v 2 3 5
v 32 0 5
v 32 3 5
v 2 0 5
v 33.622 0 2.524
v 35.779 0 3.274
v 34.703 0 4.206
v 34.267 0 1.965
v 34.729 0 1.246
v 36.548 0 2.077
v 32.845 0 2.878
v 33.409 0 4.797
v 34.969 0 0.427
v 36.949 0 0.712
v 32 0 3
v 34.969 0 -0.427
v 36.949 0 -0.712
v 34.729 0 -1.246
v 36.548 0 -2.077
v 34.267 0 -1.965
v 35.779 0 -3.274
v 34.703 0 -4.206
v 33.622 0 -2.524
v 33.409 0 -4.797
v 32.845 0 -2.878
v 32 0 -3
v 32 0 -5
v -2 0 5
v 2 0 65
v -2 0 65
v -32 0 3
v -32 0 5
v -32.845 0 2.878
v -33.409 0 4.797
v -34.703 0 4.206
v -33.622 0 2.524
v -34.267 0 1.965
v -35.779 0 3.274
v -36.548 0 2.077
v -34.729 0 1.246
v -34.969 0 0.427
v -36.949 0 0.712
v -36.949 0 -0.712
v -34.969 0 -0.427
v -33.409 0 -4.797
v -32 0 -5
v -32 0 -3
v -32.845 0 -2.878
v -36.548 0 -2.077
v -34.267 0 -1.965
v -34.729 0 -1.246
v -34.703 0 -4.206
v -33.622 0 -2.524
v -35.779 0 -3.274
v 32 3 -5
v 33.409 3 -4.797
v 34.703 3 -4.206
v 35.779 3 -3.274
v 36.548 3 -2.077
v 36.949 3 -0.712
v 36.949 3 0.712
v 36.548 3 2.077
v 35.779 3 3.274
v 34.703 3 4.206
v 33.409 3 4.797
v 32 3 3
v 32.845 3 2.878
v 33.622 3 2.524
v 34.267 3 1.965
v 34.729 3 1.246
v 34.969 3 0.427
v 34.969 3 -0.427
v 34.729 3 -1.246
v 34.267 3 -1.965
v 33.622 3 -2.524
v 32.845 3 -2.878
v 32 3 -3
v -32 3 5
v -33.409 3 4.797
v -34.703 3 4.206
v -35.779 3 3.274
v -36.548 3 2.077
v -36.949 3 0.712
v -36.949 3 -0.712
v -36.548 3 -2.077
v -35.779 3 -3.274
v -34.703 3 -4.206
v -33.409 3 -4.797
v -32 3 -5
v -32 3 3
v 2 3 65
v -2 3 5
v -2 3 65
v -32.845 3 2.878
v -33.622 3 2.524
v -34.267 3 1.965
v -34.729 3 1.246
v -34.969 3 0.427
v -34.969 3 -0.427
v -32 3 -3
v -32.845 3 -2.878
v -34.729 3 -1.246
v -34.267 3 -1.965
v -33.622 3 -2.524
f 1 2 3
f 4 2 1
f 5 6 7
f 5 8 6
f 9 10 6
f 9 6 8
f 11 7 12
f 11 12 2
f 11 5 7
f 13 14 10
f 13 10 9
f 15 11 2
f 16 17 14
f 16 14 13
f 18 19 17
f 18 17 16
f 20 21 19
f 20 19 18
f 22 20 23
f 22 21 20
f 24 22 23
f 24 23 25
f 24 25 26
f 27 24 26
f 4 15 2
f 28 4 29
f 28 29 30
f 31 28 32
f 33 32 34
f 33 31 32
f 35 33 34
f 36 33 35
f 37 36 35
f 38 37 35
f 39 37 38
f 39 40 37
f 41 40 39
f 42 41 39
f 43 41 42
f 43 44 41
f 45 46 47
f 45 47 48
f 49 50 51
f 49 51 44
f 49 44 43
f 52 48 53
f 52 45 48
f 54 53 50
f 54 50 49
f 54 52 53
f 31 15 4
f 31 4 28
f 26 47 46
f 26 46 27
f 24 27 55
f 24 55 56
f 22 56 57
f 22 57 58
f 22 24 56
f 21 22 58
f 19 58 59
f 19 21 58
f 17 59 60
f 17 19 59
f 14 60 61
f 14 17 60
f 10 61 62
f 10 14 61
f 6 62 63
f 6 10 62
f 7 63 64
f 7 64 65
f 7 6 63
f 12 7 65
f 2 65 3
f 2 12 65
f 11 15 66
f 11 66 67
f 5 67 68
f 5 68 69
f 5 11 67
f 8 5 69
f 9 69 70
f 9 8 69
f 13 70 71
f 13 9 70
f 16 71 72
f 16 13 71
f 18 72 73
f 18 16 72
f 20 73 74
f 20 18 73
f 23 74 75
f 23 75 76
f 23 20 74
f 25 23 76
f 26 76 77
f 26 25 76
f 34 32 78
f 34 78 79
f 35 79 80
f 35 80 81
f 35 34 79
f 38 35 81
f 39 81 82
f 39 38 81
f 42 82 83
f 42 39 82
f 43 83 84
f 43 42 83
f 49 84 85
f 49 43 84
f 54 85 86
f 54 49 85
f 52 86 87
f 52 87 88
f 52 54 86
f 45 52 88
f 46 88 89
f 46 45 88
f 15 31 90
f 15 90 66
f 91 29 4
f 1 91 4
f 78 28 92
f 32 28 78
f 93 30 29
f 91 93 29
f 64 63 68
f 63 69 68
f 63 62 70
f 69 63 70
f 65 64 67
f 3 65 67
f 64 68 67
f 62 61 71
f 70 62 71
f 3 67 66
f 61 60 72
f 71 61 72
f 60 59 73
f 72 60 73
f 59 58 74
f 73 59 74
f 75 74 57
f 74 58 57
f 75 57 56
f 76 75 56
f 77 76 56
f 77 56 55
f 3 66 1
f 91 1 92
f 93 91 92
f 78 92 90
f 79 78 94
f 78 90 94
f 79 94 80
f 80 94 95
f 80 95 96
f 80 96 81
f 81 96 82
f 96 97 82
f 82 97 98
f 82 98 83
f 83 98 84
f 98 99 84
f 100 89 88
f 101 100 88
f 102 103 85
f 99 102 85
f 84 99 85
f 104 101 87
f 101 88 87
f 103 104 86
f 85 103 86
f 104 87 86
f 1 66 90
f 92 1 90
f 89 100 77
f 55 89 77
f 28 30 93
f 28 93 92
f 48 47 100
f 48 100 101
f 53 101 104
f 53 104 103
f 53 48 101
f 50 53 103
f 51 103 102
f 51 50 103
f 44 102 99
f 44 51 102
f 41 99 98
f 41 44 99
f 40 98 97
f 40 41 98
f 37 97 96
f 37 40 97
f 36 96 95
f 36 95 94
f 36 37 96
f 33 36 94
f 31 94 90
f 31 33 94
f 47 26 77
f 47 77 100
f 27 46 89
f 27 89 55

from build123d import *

# Parameters (mm, degrees)
SKETCH2_W           = 4
SKETCH2_H           = 60
BOSS_EXTRUDE1_DEPTH = 3


with BuildPart() as part:
    # Sketch2 → Boss-Extrude1 (new body)
    # profile 1 of 2: a face of its own
    with BuildSketch(Plane(origin=(0, 0, 0), x_dir=(1, 0, 0), z_dir=(0, 1, 0))):
        with BuildLine():
            Line((-32, 5), (32, 5))
            ThreePointArc((32, 5), (37, 0), (32, -5))
            Line((32, -5), (-32, -5))
            ThreePointArc((-32, -5), (-37, 0), (-32, 5))
        make_face()
        with BuildLine():
            ThreePointArc((32, -3), (35, 0), (32, 3))
            Line((32, 3), (-32, 3))
            ThreePointArc((-32, 3), (-35, 0), (-32, -3))
            Line((-32, -3), (32, -3))
        make_face(mode=Mode.SUBTRACT)
    # profile 2 of 2: a face of its own
    with BuildSketch(Plane(origin=(0, 0, 0), x_dir=(1, 0, 0), z_dir=(0, 1, 0))):
        with Locations((0, -35)):
            Rectangle(SKETCH2_W, SKETCH2_H)
    extrude(amount=BOSS_EXTRUDE1_DEPTH)


solid = part.part
